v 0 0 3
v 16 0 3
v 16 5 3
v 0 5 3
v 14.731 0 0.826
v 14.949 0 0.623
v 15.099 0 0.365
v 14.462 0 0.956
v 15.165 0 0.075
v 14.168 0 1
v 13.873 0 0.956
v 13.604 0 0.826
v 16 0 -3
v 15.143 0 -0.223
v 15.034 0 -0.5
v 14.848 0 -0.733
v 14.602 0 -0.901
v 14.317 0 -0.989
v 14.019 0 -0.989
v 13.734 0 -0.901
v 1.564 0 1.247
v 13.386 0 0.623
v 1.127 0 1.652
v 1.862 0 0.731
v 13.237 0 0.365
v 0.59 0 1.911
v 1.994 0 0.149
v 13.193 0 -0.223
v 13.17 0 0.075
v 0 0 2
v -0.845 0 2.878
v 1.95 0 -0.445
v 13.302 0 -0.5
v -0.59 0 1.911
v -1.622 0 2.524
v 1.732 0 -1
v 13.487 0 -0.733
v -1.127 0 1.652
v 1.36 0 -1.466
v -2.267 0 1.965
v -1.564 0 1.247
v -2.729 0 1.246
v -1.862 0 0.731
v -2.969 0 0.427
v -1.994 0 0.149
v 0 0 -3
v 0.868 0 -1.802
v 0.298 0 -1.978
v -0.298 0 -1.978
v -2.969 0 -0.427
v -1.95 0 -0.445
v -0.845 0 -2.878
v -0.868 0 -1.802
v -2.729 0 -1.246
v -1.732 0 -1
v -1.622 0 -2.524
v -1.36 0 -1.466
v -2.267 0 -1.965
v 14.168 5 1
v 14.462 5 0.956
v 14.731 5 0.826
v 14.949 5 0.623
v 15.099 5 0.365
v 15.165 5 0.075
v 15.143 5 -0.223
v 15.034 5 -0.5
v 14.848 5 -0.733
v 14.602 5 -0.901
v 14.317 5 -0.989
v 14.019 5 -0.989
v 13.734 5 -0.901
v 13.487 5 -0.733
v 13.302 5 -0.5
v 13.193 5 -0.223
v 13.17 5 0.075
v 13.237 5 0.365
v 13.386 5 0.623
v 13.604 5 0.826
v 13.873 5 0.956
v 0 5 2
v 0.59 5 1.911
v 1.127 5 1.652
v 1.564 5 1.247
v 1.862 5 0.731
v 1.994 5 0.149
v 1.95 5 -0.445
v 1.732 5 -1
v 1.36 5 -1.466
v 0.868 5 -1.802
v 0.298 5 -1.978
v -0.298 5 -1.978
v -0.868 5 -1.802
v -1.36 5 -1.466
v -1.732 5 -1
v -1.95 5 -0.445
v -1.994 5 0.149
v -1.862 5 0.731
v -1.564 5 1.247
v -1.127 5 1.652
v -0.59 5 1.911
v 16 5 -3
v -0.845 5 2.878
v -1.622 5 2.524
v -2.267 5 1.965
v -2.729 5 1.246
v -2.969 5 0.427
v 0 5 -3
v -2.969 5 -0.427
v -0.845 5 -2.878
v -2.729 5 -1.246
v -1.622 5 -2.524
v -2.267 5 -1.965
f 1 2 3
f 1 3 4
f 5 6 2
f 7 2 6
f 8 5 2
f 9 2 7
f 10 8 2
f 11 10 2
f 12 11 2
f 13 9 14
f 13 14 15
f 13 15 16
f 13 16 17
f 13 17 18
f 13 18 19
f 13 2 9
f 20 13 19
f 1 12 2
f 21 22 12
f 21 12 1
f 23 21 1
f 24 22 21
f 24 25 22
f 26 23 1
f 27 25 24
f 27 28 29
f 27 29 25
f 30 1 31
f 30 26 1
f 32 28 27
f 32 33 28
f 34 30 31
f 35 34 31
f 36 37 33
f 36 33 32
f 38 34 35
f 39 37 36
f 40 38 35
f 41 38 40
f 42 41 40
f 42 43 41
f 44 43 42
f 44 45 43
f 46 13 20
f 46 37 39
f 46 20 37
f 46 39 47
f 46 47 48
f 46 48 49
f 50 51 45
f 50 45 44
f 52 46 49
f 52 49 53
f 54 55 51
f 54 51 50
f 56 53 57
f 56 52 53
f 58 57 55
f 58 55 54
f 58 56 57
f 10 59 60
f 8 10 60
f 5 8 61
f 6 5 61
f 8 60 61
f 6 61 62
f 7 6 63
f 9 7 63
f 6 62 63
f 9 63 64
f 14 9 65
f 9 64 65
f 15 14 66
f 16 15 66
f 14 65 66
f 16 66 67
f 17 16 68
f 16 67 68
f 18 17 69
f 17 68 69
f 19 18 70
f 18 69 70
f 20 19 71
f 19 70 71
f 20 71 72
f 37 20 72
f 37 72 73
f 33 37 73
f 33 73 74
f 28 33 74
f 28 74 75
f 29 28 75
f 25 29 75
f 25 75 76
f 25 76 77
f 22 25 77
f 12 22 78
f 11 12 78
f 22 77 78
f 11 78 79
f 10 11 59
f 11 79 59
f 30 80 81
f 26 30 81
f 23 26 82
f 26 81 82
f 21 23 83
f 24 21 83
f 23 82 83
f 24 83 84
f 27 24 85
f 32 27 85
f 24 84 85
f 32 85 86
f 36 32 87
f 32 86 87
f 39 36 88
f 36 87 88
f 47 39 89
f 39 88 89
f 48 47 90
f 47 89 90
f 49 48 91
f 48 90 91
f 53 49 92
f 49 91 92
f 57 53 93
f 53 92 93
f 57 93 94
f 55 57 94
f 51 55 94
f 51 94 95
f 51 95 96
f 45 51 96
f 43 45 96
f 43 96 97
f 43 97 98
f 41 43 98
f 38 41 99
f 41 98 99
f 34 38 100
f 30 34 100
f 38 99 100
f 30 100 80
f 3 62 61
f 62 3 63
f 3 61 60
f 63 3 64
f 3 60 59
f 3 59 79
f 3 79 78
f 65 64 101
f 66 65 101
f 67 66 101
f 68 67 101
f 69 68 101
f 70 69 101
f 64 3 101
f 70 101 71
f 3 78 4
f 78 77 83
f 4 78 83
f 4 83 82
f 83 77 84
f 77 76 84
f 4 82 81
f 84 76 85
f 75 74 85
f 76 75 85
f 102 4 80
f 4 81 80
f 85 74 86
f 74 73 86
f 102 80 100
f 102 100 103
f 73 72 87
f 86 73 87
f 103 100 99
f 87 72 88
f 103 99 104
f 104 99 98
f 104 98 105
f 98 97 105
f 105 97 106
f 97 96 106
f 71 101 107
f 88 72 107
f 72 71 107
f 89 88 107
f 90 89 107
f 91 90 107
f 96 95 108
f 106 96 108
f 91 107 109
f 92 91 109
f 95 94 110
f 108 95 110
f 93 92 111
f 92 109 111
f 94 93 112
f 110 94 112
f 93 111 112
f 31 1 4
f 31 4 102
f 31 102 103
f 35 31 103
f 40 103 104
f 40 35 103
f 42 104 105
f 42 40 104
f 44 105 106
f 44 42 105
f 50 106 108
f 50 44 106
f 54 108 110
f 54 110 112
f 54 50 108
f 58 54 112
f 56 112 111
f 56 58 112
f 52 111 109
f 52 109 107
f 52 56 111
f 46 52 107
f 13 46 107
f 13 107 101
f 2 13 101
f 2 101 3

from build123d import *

# Parameters (mm, degrees)
EXTRUDE_1_DEPTH     = 5
SKETCH_3_R          = 2
CUT_EXTRUDE_1_DEPTH = 5
SKETCH_4_R          = 1
CUT_EXTRUDE_2_DEPTH = 5


with BuildPart() as part:
    # 草图2 → 凸台-拉伸1 (new body)
    with BuildSketch(Plane(origin=(0, 0, 0), x_dir=(1, 0, 0), z_dir=(0, 1, 0))):
        with BuildLine():
            Line((0, 3), (16, 3))
            Line((16, 3), (16, -3))
            Line((16, -3), (0, -3))
            ThreePointArc((0, -3), (-3, 0), (0, 3))
        make_face()
    extrude(amount=EXTRUDE_1_DEPTH)

    # 草图3 → 切除-拉伸1 (cut)
    with BuildSketch(Plane(origin=(0, 5, 0), x_dir=(1, 0, 0), z_dir=(0, 1, 0))):
        with Locations(Location((0, 0, 0), (0, 0, 270))):
            Circle(SKETCH_3_R)
    extrude(amount=-CUT_EXTRUDE_1_DEPTH, mode=Mode.SUBTRACT)

    # 草图4 → 切除-拉伸2 (cut)
    with BuildSketch(Plane(origin=(0, 5, 0), x_dir=(1, 0, 0), z_dir=(0, 1, 0))):
        with Locations(Location((14.167639534, 0, 0), (0, 0, 270))):
            Circle(SKETCH_4_R)
    extrude(amount=-CUT_EXTRUDE_2_DEPTH, mode=Mode.SUBTRACT)


solid = part.part
